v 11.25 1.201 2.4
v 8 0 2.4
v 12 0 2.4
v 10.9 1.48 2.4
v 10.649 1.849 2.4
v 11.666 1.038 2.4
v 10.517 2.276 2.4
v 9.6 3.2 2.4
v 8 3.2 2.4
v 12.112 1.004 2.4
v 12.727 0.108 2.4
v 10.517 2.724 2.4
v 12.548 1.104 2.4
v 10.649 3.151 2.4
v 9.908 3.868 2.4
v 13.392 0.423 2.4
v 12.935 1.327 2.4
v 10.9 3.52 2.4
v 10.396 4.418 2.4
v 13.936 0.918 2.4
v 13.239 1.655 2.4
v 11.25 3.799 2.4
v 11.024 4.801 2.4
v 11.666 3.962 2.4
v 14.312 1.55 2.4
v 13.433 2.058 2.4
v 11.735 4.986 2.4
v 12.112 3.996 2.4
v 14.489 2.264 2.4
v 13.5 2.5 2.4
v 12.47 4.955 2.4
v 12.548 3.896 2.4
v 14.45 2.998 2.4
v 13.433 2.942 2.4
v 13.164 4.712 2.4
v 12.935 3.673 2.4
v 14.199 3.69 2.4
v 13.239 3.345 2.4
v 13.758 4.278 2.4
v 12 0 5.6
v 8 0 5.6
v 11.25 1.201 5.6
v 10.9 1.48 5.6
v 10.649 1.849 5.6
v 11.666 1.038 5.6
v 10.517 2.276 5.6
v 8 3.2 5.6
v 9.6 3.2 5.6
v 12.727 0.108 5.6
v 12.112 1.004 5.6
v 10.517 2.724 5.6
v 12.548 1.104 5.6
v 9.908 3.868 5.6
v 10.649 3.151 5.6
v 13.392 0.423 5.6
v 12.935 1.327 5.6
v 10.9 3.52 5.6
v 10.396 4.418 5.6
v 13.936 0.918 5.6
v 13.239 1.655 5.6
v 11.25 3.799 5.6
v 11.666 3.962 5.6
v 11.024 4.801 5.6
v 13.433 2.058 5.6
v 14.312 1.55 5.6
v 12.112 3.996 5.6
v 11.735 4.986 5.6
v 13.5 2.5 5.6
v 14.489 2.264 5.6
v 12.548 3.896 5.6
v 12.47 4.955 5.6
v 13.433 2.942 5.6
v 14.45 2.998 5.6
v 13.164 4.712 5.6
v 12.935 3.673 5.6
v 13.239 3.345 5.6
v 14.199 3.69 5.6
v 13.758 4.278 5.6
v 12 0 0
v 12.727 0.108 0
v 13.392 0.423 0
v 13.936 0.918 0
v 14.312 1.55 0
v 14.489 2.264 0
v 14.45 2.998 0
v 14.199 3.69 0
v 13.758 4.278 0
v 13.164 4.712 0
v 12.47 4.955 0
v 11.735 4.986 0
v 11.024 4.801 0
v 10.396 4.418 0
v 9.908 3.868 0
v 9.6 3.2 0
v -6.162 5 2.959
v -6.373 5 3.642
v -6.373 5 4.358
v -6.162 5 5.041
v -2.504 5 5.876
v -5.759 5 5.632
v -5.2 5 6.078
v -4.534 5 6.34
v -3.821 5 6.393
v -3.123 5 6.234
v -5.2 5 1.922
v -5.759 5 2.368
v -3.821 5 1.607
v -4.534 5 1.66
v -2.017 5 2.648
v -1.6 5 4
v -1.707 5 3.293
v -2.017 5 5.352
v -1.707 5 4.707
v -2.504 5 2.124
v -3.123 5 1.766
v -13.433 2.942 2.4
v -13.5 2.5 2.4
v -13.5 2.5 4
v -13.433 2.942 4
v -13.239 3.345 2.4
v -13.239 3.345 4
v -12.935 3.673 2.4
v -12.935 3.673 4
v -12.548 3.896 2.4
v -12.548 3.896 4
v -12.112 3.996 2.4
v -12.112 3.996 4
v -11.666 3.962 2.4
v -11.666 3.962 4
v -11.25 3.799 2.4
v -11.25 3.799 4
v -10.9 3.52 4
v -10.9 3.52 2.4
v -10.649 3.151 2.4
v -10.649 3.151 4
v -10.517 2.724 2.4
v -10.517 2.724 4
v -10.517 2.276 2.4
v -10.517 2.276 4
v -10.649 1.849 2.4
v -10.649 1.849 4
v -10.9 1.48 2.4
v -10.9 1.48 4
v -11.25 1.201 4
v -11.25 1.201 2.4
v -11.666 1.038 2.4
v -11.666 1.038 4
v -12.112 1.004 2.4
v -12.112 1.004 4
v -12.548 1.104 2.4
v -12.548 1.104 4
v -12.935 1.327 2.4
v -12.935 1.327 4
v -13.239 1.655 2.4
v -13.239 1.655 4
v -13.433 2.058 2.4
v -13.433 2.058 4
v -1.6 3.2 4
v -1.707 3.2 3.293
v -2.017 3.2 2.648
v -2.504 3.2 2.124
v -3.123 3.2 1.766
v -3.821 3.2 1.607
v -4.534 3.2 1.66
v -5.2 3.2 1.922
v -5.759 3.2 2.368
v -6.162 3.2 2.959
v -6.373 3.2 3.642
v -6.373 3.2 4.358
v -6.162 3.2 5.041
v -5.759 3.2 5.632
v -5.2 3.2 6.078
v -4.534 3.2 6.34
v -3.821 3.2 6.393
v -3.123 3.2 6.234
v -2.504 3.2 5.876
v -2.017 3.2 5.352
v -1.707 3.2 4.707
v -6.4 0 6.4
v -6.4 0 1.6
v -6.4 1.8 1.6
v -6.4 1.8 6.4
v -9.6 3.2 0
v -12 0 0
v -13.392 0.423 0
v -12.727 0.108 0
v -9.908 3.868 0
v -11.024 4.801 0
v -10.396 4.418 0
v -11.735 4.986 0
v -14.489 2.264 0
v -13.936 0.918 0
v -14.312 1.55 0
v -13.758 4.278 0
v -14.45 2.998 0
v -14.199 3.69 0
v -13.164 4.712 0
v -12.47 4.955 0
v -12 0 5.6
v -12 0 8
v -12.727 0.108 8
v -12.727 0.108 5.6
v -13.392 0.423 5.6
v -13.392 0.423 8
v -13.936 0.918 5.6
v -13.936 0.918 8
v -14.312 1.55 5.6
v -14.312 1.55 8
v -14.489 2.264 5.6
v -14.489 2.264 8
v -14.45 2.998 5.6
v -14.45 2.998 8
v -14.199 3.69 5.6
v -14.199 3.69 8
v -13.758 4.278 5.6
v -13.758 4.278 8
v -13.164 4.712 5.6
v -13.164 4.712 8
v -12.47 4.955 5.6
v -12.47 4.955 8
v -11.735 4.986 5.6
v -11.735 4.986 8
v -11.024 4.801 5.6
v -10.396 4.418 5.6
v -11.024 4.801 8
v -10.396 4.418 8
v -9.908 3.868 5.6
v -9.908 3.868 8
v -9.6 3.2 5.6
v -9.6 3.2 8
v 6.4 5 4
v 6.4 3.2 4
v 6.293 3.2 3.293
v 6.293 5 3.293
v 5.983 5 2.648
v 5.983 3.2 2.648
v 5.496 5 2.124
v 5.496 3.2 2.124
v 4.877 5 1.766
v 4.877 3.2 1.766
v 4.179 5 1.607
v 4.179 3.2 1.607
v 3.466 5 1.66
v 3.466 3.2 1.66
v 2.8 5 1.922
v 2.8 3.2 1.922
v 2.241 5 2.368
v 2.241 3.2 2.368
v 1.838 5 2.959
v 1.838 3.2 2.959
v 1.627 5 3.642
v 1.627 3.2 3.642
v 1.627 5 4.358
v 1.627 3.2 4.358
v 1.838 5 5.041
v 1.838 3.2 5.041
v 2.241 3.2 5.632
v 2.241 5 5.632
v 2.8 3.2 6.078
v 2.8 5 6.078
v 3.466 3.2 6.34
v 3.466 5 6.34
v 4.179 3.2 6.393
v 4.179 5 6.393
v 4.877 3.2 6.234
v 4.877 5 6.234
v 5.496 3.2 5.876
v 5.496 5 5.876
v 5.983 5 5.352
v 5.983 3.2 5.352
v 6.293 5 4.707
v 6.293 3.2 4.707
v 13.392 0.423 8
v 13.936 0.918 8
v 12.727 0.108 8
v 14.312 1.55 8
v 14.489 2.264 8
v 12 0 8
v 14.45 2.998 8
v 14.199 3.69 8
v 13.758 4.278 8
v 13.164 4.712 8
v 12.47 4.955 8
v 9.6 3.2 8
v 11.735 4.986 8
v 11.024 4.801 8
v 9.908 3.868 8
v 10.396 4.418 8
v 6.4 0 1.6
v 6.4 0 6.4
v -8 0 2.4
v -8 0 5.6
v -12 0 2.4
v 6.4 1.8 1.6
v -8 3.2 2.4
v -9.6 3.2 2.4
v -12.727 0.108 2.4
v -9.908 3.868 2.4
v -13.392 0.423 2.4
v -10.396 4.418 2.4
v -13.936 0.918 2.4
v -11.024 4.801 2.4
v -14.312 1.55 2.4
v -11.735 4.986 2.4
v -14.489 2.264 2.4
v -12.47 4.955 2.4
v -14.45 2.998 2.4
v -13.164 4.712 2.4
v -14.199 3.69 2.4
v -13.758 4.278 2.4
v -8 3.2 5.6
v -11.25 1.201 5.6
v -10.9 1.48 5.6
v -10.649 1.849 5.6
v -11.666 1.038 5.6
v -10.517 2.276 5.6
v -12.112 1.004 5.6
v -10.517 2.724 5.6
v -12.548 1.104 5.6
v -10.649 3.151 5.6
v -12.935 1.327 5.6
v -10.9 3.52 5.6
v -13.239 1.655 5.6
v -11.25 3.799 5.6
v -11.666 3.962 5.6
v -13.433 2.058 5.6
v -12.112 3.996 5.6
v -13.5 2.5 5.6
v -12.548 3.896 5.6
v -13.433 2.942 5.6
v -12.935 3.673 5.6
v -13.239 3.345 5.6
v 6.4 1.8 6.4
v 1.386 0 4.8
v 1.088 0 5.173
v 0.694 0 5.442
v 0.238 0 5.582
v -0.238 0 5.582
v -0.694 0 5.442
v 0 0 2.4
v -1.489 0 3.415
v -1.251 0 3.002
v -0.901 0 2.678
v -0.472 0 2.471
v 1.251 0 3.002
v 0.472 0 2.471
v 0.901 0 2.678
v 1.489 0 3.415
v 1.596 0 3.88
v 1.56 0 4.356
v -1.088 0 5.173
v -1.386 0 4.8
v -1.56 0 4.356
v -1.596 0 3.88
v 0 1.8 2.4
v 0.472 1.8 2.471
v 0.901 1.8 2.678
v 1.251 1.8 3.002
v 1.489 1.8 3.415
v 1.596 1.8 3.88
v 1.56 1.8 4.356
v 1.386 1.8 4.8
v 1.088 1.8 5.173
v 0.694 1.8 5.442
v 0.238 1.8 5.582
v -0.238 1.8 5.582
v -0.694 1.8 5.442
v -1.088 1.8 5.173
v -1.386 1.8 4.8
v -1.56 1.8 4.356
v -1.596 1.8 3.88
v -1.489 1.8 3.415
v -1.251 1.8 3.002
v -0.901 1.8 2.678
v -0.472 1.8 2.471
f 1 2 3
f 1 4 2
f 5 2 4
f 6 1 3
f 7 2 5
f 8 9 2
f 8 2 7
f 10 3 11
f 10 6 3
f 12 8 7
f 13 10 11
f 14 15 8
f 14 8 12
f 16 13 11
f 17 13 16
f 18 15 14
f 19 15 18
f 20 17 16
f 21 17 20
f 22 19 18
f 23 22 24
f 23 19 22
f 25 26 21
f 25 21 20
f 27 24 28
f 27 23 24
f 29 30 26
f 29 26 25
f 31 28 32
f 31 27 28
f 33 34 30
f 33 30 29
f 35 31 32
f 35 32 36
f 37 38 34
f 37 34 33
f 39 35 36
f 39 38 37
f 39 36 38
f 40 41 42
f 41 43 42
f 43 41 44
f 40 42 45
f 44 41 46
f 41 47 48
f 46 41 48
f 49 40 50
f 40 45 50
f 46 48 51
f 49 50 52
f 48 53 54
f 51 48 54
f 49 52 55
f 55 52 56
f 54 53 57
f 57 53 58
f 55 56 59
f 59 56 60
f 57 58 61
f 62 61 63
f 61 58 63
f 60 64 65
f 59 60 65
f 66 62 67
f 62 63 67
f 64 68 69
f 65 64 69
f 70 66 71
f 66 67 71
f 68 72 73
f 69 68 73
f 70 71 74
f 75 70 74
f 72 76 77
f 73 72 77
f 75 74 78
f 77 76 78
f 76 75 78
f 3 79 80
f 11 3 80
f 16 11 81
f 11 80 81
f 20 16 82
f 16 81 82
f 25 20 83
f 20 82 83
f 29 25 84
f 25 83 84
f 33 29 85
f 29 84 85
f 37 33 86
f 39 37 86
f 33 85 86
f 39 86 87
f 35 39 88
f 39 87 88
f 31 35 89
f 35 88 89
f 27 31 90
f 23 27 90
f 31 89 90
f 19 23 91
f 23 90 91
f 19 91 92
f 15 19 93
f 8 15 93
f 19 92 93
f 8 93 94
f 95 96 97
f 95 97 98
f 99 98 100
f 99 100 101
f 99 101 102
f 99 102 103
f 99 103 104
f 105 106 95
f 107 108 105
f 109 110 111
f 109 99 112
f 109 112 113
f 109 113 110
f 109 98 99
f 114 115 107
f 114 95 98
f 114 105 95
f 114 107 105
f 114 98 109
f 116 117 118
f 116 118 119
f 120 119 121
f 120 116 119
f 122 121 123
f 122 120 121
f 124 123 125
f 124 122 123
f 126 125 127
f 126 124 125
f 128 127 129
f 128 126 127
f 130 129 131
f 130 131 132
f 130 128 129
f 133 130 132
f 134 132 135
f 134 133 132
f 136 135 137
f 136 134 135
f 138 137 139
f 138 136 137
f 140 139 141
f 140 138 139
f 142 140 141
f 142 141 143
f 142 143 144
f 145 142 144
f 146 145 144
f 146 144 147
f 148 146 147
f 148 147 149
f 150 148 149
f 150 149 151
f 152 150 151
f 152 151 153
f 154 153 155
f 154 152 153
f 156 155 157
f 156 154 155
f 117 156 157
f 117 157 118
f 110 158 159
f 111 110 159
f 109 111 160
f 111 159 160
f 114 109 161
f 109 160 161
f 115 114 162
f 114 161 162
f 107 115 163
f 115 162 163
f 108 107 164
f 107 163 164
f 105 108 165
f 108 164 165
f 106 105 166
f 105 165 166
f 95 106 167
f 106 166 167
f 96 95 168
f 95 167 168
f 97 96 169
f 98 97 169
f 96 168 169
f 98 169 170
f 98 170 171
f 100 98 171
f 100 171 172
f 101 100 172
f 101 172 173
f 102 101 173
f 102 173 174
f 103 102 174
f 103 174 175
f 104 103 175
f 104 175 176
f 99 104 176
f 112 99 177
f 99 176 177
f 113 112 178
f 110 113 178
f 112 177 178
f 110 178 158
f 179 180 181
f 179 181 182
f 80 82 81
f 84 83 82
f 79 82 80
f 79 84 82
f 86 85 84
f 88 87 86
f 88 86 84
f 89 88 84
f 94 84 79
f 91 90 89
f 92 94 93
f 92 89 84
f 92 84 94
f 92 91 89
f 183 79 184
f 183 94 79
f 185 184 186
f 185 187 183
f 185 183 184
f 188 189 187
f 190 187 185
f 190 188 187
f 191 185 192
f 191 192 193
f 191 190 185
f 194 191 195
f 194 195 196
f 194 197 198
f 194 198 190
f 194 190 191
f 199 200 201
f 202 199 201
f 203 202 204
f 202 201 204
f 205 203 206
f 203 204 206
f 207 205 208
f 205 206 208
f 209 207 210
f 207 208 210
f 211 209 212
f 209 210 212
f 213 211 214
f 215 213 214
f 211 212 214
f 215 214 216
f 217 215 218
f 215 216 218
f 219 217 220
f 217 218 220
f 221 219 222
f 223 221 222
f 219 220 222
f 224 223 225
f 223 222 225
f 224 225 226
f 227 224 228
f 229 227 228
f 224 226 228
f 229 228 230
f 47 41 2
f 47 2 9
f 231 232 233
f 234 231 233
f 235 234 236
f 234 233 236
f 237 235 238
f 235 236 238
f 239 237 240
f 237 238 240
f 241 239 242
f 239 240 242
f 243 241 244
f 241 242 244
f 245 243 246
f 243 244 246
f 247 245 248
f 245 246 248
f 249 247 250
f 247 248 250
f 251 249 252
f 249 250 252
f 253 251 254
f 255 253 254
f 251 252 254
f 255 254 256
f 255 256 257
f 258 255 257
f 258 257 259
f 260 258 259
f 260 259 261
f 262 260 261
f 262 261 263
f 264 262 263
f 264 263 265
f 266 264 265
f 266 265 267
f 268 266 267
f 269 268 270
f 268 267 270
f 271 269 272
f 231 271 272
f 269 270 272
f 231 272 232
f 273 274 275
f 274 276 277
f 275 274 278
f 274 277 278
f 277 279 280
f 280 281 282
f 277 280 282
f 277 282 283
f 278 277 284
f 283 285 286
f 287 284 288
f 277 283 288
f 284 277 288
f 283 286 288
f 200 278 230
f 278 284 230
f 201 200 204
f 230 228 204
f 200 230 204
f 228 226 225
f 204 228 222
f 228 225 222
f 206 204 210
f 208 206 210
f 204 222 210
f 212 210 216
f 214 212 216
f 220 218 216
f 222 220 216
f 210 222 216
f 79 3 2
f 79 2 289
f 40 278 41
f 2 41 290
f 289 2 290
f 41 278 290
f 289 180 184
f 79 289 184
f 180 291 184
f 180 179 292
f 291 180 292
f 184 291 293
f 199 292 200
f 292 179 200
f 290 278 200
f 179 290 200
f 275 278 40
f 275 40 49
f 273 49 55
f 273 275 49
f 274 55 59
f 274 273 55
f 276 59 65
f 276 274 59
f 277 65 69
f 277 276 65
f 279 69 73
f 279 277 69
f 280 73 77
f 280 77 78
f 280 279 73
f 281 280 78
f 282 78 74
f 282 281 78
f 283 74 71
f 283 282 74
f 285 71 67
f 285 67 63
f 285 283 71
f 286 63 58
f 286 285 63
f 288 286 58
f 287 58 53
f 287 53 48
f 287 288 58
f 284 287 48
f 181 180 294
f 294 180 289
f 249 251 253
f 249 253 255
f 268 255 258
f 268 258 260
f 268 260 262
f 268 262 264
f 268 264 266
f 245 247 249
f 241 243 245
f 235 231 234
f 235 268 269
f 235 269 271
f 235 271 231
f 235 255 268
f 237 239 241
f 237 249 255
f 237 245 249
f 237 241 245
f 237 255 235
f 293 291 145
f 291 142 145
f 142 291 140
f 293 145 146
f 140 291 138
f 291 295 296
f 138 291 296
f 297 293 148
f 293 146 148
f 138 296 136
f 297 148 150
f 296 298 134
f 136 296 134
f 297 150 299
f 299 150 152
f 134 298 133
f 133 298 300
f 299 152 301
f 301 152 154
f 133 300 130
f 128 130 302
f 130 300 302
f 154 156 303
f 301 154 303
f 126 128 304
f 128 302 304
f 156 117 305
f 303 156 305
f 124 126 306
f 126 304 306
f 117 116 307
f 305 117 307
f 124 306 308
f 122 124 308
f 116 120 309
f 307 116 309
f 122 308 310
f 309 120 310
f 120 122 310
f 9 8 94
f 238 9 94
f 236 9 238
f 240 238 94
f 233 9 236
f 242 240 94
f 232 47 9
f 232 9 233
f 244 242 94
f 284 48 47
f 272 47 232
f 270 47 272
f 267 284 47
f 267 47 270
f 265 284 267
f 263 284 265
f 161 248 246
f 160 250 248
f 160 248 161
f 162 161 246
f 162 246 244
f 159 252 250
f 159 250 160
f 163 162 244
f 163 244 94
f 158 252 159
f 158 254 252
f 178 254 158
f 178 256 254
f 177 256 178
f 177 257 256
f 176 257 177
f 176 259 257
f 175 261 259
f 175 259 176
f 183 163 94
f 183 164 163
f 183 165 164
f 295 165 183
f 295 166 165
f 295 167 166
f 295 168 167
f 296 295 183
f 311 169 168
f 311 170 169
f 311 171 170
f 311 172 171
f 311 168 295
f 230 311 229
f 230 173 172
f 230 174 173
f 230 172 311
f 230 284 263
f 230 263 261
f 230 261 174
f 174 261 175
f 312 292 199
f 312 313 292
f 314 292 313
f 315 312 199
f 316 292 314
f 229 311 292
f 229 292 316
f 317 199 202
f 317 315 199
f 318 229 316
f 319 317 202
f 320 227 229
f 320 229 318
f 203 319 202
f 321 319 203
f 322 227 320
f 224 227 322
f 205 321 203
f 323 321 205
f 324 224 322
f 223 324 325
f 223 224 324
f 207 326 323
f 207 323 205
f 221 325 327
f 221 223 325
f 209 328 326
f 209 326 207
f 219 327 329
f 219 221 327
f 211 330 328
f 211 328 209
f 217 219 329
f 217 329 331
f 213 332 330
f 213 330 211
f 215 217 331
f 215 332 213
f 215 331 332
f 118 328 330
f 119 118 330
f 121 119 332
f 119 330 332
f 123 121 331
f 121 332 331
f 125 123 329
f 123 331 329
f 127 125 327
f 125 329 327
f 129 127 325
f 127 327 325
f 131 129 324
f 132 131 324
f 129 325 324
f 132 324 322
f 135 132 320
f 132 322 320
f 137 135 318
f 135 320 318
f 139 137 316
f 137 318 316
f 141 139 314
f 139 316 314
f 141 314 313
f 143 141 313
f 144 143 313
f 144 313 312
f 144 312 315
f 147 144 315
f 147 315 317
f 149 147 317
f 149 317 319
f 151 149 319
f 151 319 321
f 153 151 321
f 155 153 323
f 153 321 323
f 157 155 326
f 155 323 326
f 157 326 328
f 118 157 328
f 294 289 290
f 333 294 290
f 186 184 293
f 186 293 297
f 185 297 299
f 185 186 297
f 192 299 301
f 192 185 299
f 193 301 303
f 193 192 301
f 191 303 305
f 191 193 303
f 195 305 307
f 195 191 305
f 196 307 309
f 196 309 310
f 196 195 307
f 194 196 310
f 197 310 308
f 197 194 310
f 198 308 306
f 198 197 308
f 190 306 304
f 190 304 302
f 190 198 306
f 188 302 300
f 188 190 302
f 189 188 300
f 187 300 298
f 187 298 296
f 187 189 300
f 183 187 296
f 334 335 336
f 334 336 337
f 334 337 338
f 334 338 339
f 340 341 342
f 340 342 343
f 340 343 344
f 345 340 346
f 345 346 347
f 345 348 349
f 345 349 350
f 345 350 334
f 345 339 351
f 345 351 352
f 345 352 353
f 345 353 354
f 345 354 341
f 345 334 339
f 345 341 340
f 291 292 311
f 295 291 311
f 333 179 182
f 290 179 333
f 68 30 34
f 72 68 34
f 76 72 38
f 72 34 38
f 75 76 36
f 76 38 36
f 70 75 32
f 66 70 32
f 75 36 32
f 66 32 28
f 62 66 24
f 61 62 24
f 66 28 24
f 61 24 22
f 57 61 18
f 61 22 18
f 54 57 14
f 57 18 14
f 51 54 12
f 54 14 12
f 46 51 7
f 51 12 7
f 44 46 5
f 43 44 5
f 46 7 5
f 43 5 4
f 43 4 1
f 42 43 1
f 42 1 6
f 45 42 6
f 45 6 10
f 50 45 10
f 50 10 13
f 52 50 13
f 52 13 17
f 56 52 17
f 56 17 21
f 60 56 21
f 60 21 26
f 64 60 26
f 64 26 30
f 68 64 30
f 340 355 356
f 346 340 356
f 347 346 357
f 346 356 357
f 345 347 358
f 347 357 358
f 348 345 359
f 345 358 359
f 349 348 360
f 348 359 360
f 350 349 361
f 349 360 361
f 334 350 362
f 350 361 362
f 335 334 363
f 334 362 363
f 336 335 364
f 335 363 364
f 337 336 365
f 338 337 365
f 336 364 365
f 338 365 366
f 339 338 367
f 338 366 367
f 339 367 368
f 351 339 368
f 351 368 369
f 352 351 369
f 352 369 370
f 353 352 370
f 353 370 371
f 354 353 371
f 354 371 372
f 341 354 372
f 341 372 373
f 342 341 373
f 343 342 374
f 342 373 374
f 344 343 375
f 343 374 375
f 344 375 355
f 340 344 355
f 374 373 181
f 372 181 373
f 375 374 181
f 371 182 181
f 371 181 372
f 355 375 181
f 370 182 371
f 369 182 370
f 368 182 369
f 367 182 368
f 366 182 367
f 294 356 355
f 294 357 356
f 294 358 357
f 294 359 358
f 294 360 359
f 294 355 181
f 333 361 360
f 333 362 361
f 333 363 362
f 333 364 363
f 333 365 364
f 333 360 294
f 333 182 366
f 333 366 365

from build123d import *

# Parameters (mm, degrees)
BOSS_EXTRUDE1_DEPTH = 2.4
SKETCH2_R           = 1.5
BOSS_EXTRUDE2_DEPTH = 1.6
SKETCH3_W           = 8
SKETCH3_H           = 3.2
BOSS_EXTRUDE3_DEPTH = 1.6
SKETCH4_R           = 2.4
BOSS_EXTRUDE4_DEPTH = 1.8
SKETCH5_W           = 12.8
SKETCH5_H           = 4.8
CUT_EXTRUDE1_DEPTH  = 1.8
SKETCH6_R           = 1.6
BOSS_EXTRUDE5_DEPTH = 1.8


with BuildPart() as part:
    # Sketch1 → Boss-Extrude1 (new body)
    with BuildSketch(Plane.XY):
        with BuildLine():
            Line((9.6, 3.2), (0, 3.2))
            Line((0, 3.2), (0, 0))
            Line((0, 0), (12, 0))
            ThreePointArc((12, 0), (14, 4), (9.6, 3.2))
        make_face()
    extrude(amount=BOSS_EXTRUDE1_DEPTH)

    # Sketch2 → Boss-Extrude2 (add)
    with BuildSketch(Plane.XY.offset(2.4)):
        with Locations((12, 2.5)):
            Circle(SKETCH2_R)
    extrude(amount=BOSS_EXTRUDE2_DEPTH)

    # Sketch3 → Boss-Extrude3 (add)
    with BuildSketch(Plane.XY.offset(2.4)):
        with Locations((4, 1.6)):
            Rectangle(SKETCH3_W, SKETCH3_H)
    extrude(amount=BOSS_EXTRUDE3_DEPTH)

    # Mirror2: part across plane


with BuildPart() as part_1:
    add(part.part)
    add(part.part.mirror(Plane(origin=(12, 2.5, 4), x_dir=(1, 0, 0), z_dir=(0, 0, 1))))

    # Mirror3: part across plane


with BuildPart() as part_2:
    add(part_1.part)
    add(part_1.part.mirror(Plane(origin=(0, 3.2, 2.4), x_dir=(0, 0, 1), z_dir=(1, 0, 0))))

    # Sketch4 → Boss-Extrude4 (add)
    with BuildSketch(Plane(origin=(0, 3.2, 0), x_dir=(1, 0, 0), z_dir=(0, 1, 0))):
        with Locations((-4, -4)):
            Circle(SKETCH4_R)
        with Locations((4, -4)):
            Circle(SKETCH4_R)
    extrude(amount=BOSS_EXTRUDE4_DEPTH)

    # Sketch5 → Cut-Extrude1 (cut)
    with BuildSketch(Plane.XZ):
        with Locations((0, 4)):
            Rectangle(SKETCH5_W, SKETCH5_H)
    extrude(amount=-CUT_EXTRUDE1_DEPTH, mode=Mode.SUBTRACT)

    # Sketch6 → Boss-Extrude5 (add)
    with BuildSketch(Plane.XZ.offset(-1.8)):
        with Locations((0, 4)):
            Circle(SKETCH6_R)
    extrude(amount=BOSS_EXTRUDE5_DEPTH)


solid = part_2.part
